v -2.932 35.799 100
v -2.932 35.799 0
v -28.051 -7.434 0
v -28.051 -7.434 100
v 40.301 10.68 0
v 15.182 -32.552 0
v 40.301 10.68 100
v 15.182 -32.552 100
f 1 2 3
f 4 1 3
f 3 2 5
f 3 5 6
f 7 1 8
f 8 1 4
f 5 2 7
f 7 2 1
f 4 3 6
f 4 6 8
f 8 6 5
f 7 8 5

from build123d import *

# Parameters (mm, degrees)
F1_DEPTH = 100
F2_DEPTH = 8.961
F3_DEPTH = 8.961
F4_DEPTH = 8.961


with BuildPart() as f1:
    # F0 (on Top) → F1 (new body)
    with BuildSketch(Plane.XY):
        Polygon((-10.6803802773, 40.3006346896), (-40.3006346896, -10.6803802773), (10.6803802773, -40.3006346896), (40.3006346896, 10.6803802773), align=None)
    extrude(amount=F1_DEPTH)

    # F2 (add): a face of the model
    f2_faces = [f1.faces().sort_by_distance(p)[0] for p in [
        (-25.4905074835, 14.8101272061, 50),
    ]]
    extrude(f2_faces, amount=-F2_DEPTH)

    # F3 (cut): a face of the model
    f3_faces = [f1.faces().sort_by_distance(p)[0] for p in [
        (-25.4905074835, 14.8101272061, 50),
    ]]
    extrude(f3_faces, amount=-F3_DEPTH, mode=Mode.SUBTRACT)

    # F4 (cut): a face of the model
    f4_faces = [f1.faces().sort_by_distance(p)[0] for p in [
        (-10.9360468067, -27.7413698313, 50),
    ]]
    extrude(f4_faces, amount=-F4_DEPTH, mode=Mode.SUBTRACT)


solid = f1.part
